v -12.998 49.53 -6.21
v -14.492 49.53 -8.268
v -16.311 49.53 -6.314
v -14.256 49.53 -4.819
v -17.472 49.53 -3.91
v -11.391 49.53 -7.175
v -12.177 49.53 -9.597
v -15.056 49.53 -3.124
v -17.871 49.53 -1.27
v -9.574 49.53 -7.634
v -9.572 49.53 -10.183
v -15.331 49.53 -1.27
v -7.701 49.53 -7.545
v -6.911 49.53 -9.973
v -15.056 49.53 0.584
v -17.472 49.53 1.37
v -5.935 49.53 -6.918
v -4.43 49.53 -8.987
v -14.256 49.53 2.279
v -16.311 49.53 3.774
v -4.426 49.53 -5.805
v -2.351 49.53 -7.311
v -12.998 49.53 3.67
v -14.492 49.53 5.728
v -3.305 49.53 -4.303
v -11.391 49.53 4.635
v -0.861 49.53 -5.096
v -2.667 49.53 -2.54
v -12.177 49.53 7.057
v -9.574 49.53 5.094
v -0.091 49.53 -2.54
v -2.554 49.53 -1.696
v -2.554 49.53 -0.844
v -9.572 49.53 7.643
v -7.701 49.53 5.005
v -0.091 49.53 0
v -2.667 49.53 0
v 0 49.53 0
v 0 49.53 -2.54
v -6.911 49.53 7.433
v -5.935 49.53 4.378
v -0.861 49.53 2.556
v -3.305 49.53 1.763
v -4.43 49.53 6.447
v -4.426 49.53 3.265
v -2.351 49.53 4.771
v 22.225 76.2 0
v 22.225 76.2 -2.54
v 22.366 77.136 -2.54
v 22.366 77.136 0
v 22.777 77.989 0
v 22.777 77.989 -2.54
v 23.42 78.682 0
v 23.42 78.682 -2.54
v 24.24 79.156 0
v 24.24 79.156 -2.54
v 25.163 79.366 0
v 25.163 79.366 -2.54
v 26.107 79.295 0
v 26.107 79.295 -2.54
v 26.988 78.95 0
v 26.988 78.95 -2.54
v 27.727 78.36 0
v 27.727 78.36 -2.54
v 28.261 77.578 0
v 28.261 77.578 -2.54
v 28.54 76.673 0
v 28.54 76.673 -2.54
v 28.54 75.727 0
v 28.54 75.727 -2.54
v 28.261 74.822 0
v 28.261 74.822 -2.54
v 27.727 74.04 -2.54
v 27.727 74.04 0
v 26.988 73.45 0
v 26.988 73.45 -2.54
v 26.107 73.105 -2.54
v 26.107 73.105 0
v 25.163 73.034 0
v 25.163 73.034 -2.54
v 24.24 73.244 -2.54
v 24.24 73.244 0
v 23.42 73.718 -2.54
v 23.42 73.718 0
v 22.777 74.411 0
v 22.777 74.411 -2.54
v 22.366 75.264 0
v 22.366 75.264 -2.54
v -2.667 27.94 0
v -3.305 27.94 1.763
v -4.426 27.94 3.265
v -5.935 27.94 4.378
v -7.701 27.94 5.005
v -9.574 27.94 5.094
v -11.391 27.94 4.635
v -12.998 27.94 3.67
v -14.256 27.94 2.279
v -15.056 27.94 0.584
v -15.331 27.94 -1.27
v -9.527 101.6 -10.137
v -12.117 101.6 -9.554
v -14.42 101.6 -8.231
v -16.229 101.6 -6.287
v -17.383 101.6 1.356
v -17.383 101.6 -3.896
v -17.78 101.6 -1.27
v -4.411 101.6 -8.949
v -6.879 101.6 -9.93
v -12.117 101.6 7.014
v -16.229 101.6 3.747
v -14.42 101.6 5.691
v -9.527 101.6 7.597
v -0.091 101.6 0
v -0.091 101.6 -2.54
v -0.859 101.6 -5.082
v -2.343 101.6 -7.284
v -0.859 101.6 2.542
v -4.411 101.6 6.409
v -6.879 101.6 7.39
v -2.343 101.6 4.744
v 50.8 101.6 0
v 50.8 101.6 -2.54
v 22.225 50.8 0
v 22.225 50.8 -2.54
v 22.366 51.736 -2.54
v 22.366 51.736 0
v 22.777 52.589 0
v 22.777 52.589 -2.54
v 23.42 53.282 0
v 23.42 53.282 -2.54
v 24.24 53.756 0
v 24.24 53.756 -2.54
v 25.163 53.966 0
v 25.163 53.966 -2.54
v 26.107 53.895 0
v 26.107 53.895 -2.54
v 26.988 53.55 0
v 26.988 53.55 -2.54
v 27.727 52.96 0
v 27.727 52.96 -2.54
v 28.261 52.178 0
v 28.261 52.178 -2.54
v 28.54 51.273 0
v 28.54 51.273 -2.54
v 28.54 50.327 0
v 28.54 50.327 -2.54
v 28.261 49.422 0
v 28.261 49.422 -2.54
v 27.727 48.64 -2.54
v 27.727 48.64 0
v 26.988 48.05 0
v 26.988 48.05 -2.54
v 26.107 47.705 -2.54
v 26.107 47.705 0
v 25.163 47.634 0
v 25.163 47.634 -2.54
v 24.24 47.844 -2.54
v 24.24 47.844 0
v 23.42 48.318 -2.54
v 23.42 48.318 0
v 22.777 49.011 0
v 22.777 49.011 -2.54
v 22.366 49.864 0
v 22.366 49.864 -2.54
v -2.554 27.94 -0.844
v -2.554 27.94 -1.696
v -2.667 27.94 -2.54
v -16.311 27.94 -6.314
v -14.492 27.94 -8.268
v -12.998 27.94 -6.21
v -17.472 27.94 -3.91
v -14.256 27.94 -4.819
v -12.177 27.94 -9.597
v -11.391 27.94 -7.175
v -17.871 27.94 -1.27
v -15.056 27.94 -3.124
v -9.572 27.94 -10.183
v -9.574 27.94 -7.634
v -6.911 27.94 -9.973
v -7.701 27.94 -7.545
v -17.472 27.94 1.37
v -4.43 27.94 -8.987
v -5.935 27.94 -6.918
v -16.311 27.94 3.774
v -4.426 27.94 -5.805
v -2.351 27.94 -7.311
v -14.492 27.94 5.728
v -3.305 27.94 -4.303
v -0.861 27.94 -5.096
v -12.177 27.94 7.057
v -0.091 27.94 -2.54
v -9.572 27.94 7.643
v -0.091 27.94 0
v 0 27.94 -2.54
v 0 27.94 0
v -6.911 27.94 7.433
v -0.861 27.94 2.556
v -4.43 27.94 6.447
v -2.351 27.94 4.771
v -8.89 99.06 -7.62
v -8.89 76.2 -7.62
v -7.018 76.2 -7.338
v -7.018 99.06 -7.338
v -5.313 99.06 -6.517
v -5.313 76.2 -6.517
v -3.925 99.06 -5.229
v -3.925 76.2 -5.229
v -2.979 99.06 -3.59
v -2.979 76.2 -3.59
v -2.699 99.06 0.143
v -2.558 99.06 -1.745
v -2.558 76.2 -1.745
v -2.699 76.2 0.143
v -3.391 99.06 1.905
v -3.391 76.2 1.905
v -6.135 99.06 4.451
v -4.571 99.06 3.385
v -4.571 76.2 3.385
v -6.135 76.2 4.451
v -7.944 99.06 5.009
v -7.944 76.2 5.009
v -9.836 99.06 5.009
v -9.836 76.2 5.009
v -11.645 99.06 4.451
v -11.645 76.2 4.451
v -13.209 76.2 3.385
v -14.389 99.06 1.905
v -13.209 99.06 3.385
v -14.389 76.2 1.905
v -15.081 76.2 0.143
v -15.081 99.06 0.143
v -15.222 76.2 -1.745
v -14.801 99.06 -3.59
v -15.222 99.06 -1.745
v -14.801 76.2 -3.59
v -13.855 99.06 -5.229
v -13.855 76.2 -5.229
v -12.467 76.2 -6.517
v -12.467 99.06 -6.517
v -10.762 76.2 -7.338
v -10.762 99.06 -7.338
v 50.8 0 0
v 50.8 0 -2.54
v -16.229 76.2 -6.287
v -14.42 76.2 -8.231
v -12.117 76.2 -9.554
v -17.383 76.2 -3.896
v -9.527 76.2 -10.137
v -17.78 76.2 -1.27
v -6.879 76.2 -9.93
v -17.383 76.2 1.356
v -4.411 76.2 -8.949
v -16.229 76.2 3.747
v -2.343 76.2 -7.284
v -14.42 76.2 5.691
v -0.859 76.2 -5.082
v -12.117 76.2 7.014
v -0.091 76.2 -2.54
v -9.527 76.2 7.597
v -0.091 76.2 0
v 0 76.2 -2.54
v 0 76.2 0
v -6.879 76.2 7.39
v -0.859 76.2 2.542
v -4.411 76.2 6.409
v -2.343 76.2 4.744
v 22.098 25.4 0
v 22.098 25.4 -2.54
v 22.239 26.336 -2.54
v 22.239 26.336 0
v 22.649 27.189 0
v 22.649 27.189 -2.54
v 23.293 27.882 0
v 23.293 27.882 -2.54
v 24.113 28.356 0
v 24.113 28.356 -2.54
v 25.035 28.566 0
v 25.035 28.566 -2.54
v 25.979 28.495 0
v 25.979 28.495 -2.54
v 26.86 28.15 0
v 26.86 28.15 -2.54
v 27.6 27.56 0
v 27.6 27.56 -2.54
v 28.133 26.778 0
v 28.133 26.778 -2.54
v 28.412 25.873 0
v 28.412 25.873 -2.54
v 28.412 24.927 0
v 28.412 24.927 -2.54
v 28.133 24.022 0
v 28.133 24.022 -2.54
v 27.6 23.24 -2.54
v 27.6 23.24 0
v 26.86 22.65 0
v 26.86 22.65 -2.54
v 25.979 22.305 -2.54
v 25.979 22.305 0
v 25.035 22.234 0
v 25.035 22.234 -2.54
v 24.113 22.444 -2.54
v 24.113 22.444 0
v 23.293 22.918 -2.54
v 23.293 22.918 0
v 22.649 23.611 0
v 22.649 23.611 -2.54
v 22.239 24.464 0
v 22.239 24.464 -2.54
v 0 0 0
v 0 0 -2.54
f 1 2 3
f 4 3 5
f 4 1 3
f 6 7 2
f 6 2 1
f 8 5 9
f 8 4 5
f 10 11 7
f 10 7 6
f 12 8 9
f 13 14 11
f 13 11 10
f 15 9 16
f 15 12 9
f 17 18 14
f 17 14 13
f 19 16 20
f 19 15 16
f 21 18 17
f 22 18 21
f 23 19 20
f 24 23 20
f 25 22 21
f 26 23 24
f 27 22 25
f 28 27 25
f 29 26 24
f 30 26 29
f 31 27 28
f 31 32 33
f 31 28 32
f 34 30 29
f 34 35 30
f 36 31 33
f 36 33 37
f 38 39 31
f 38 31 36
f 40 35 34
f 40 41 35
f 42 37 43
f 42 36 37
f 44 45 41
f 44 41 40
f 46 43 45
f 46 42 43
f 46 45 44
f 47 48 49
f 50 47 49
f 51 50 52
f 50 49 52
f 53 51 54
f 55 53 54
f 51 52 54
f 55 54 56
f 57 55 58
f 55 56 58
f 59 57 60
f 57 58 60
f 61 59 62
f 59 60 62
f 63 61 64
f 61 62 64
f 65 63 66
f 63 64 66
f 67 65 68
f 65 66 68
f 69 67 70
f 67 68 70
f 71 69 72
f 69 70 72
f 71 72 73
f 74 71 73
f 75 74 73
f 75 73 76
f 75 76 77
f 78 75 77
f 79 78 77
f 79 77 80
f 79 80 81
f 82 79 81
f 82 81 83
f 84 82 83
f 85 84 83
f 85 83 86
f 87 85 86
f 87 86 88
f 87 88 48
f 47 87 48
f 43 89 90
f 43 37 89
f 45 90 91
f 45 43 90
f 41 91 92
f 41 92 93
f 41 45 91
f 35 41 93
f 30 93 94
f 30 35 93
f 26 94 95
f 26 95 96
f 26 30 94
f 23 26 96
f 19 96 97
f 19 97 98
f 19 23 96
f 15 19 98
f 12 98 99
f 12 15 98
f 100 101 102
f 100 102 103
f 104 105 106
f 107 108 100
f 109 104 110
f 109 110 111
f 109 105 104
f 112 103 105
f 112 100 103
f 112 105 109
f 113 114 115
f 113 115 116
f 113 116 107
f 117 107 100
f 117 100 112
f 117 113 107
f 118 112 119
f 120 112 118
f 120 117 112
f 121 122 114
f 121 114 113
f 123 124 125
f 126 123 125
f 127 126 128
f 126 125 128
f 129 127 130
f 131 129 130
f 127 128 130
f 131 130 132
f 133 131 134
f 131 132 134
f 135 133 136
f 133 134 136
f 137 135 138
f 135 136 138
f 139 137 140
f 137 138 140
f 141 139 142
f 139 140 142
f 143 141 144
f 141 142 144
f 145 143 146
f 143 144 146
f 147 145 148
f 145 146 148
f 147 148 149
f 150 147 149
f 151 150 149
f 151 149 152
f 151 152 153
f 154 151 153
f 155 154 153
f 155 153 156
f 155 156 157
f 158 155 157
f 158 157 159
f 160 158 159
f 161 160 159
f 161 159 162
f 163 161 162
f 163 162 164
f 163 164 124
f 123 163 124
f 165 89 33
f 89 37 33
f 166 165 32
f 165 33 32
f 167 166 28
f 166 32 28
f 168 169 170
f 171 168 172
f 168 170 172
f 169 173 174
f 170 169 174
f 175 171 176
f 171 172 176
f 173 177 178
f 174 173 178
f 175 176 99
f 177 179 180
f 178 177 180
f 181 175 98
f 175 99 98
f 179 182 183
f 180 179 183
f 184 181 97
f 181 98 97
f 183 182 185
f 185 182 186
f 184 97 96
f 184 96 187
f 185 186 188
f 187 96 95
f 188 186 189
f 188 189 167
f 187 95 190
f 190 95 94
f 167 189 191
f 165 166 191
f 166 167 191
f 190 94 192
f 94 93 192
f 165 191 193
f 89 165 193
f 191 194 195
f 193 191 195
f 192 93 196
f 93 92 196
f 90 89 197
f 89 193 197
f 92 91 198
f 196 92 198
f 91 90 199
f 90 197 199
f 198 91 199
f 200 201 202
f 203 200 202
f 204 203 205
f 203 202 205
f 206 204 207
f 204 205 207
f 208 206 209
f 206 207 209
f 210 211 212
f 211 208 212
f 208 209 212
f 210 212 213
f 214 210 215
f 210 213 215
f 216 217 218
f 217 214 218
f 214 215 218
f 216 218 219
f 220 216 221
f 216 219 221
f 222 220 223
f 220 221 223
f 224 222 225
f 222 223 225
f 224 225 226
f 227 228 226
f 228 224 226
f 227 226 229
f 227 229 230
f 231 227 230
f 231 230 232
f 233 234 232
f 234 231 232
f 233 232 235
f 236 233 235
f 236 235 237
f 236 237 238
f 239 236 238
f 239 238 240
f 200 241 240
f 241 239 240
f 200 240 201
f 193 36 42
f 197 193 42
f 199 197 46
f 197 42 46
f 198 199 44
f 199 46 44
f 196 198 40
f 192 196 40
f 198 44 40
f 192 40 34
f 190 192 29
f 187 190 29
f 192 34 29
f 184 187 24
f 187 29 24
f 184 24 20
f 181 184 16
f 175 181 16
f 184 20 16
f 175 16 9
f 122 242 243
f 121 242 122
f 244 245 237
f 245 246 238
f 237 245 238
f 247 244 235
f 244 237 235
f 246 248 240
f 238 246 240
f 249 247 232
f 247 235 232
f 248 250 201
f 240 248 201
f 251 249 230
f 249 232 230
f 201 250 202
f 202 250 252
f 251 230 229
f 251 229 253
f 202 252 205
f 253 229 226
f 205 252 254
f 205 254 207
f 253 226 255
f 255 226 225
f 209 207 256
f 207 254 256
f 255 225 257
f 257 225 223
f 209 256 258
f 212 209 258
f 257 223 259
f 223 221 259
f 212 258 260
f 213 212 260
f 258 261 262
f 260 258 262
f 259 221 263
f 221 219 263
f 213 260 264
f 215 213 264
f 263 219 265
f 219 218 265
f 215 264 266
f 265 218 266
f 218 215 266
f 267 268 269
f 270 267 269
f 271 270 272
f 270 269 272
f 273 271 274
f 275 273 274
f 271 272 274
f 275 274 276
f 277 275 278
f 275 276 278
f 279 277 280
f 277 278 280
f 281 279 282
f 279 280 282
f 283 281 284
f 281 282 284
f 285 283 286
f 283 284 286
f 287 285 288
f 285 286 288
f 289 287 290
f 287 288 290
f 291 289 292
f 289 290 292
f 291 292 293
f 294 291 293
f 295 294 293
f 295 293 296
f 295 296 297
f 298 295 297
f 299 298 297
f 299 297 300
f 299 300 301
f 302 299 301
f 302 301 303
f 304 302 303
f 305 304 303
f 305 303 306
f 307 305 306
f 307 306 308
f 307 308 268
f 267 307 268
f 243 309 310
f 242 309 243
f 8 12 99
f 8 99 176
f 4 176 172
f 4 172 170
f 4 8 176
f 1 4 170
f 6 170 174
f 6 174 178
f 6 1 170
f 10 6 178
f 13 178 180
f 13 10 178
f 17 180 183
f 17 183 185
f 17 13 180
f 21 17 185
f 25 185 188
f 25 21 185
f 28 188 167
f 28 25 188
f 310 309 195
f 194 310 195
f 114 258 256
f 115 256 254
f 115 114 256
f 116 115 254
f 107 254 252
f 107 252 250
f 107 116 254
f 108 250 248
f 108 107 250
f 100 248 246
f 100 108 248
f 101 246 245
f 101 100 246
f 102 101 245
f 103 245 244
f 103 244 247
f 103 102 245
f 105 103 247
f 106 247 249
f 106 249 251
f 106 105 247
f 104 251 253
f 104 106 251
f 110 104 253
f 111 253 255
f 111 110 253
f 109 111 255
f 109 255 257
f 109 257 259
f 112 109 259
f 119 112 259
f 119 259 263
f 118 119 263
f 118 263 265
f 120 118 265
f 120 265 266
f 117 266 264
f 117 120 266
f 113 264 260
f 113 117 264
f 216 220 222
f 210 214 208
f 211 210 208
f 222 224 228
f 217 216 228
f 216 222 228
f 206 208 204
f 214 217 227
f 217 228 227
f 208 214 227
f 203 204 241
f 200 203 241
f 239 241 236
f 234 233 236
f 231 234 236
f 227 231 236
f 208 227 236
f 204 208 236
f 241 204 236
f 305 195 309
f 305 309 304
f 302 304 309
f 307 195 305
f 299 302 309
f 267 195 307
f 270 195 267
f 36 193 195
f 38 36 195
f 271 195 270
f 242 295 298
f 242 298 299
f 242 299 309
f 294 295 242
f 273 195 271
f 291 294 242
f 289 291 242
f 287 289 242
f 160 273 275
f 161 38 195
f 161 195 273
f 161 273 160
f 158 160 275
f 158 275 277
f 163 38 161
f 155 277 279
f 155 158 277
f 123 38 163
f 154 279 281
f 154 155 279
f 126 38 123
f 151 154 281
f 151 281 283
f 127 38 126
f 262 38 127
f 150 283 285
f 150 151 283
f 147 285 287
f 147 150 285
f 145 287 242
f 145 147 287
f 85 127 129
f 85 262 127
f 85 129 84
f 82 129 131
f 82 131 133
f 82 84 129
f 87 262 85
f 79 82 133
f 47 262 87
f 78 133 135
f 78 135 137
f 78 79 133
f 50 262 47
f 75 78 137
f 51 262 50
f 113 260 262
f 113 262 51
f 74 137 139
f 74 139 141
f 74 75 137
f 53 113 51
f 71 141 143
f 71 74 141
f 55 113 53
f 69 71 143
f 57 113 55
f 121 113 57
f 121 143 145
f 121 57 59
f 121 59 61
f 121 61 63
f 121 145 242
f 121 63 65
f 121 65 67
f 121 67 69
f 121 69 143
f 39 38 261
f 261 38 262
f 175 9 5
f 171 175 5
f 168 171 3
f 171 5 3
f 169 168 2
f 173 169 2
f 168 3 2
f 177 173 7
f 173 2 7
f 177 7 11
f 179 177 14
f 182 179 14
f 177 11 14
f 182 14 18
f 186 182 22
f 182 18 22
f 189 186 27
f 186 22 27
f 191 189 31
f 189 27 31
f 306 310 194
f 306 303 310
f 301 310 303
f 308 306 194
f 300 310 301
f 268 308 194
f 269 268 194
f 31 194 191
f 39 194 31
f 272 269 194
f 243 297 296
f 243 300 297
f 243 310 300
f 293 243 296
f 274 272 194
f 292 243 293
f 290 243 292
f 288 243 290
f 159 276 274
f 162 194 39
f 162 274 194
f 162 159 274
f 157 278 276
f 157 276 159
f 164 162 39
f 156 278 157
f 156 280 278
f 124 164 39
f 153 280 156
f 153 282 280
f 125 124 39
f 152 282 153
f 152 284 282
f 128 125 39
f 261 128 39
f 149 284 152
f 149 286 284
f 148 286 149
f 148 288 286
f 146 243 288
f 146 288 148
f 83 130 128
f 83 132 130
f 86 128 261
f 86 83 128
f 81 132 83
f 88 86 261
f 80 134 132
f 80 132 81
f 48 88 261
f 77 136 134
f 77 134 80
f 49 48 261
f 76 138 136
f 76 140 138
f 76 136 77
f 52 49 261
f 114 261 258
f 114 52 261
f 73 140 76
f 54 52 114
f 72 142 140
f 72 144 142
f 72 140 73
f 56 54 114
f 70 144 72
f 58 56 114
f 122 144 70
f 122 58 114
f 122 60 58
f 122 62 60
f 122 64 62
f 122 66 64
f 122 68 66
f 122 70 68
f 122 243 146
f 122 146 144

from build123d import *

# Parameters (mm, degrees)
SKETCH1_W                   = 50.8
SKETCH1_H                   = 101.6
BOSS_EXTRUDE2_DEPTH         = 2.54
F_1_4_0_25_DIAMETER_HOLE1_D = 6.35
SKETCH5_W                   = 2.54
SKETCH5_H                   = 25.4
BOSS_EXTRUDE3_REACH         = 116.046
BOSS_EXTRUDE3_END_RADIUS    = 6.35
SKETCH6_W                   = 2.54
SKETCH6_H                   = 25.4
SKETCH7_W                   = 2.54
SKETCH7_H                   = 21.59
BOSS_EXTRUDE4_REACH         = 116.05
BOSS_EXTRUDE4_END_RADIUS    = 6.395590949
SKETCH8_W                   = 2.54
SKETCH8_H                   = 21.59
BOSS_EXTRUDE5_START         = -2.54
SKETCH9_R                   = 6.35
BOSS_EXTRUDE5_DEPTH         = 2.54


with BuildPart() as part:
    # Sketch1 → Boss-Extrude2 (new body)
    with BuildSketch(Plane.XY):
        with Locations((25.4, 50.8)):
            Rectangle(SKETCH1_W, SKETCH1_H)
    extrude(amount=-BOSS_EXTRUDE2_DEPTH)

    # 1/4 (0.25) Diameter Hole1 (through all)
    with Locations(Plane(origin=(25.4, 76.2, 0), x_dir=(1, 0, 0), z_dir=(0, 0, 1))):
        with Locations((0, 0), (-0.127319097, -50.8), (0, -25.4)):
            Hole(F_1_4_0_25_DIAMETER_HOLE1_D / 2)



with BuildPart() as body_2:
    # Sketch5 → Revolve2 (revolve)
    with BuildSketch(Plane.XY.offset(-1.27), mode=Mode.PRIVATE) as revolve2_sk:
        with Locations((-1.27, 88.9)):
            Rectangle(SKETCH5_W, SKETCH5_H)
    revolve(revolve2_sk.sketch.rotate(Axis((-8.89, 0, -1.27), (0, 1, 0)), 90), axis=Axis((-8.89, 0, -1.27), (0, 1, 0)))


with BuildPart() as part_1:
    add(part.part)

    add(body_2.part)  # Boss-Extrude3 merges body 2
    # Boss-Extrude3: up to this cylinder (the profile starts outside it)
    boss_extrude3_end = Plane(origin=(-8.89, 88.9, -1.27), z_dir=(0, -1, 0)) * Cylinder(BOSS_EXTRUDE3_END_RADIUS, 245.792, mode=Mode.PRIVATE)
    # Sketch6 → Boss-Extrude3 (add, up to the surface)
    with BuildSketch(Plane.ZY, mode=Mode.PRIVATE) as boss_extrude3_sk1:
        with Locations((-1.27, 88.9)):
            Rectangle(SKETCH6_W, SKETCH6_H)
    boss_extrude3_tool1 = extrude(boss_extrude3_sk1.sketch, amount=BOSS_EXTRUDE3_REACH, mode=Mode.PRIVATE) - boss_extrude3_end
    add(boss_extrude3_tool1.solids().sort_by_distance((0, 88.9, -1.27))[0])



with BuildPart() as body_2_2:
    # Sketch7 → Revolve3 (revolve)
    with BuildSketch(Plane.XY.offset(-1.27), mode=Mode.PRIVATE) as revolve3_sk:
        with Locations((-1.27, 38.735)):
            Rectangle(SKETCH7_W, SKETCH7_H)
    revolve(revolve3_sk.sketch.rotate(Axis((-8.935590949, 101.6, -1.27), (0, -1, 0)), 180), axis=Axis((-8.935590949, 101.6, -1.27), (0, -1, 0)))


with BuildPart() as part_2:
    add(part_1.part)

    add(body_2_2.part)  # Boss-Extrude4 merges body 2 2
    # Boss-Extrude4: up to this cylinder (the profile starts outside it)
    boss_extrude4_end = Plane(origin=(-8.935590949, 38.735, -1.27), z_dir=(0, 1, 0)) * Cylinder(BOSS_EXTRUDE4_END_RADIUS, 245.891181898, mode=Mode.PRIVATE)
    # Sketch8 → Boss-Extrude4 (add, up to the surface)
    with BuildSketch(Plane.ZY, mode=Mode.PRIVATE) as boss_extrude4_sk1:
        with Locations((-1.27, 38.735)):
            Rectangle(SKETCH8_W, SKETCH8_H)
    boss_extrude4_tool1 = extrude(boss_extrude4_sk1.sketch, amount=BOSS_EXTRUDE4_REACH, mode=Mode.PRIVATE) - boss_extrude4_end
    add(boss_extrude4_tool1.solids().sort_by_distance((0, 38.735, -1.27))[0])

    # Sketch9 → Boss-Extrude5 (add)
    with BuildSketch(Plane(origin=(0, 101.6, 0), x_dir=(1, 0, 0), z_dir=(0, 1, 0)).offset(BOSS_EXTRUDE5_START)):
        with Locations(Location((-8.89, 1.27, 0), (0, 0, 90))):
            Circle(SKETCH9_R)
    extrude(amount=BOSS_EXTRUDE5_DEPTH)


solid = part_2.part
